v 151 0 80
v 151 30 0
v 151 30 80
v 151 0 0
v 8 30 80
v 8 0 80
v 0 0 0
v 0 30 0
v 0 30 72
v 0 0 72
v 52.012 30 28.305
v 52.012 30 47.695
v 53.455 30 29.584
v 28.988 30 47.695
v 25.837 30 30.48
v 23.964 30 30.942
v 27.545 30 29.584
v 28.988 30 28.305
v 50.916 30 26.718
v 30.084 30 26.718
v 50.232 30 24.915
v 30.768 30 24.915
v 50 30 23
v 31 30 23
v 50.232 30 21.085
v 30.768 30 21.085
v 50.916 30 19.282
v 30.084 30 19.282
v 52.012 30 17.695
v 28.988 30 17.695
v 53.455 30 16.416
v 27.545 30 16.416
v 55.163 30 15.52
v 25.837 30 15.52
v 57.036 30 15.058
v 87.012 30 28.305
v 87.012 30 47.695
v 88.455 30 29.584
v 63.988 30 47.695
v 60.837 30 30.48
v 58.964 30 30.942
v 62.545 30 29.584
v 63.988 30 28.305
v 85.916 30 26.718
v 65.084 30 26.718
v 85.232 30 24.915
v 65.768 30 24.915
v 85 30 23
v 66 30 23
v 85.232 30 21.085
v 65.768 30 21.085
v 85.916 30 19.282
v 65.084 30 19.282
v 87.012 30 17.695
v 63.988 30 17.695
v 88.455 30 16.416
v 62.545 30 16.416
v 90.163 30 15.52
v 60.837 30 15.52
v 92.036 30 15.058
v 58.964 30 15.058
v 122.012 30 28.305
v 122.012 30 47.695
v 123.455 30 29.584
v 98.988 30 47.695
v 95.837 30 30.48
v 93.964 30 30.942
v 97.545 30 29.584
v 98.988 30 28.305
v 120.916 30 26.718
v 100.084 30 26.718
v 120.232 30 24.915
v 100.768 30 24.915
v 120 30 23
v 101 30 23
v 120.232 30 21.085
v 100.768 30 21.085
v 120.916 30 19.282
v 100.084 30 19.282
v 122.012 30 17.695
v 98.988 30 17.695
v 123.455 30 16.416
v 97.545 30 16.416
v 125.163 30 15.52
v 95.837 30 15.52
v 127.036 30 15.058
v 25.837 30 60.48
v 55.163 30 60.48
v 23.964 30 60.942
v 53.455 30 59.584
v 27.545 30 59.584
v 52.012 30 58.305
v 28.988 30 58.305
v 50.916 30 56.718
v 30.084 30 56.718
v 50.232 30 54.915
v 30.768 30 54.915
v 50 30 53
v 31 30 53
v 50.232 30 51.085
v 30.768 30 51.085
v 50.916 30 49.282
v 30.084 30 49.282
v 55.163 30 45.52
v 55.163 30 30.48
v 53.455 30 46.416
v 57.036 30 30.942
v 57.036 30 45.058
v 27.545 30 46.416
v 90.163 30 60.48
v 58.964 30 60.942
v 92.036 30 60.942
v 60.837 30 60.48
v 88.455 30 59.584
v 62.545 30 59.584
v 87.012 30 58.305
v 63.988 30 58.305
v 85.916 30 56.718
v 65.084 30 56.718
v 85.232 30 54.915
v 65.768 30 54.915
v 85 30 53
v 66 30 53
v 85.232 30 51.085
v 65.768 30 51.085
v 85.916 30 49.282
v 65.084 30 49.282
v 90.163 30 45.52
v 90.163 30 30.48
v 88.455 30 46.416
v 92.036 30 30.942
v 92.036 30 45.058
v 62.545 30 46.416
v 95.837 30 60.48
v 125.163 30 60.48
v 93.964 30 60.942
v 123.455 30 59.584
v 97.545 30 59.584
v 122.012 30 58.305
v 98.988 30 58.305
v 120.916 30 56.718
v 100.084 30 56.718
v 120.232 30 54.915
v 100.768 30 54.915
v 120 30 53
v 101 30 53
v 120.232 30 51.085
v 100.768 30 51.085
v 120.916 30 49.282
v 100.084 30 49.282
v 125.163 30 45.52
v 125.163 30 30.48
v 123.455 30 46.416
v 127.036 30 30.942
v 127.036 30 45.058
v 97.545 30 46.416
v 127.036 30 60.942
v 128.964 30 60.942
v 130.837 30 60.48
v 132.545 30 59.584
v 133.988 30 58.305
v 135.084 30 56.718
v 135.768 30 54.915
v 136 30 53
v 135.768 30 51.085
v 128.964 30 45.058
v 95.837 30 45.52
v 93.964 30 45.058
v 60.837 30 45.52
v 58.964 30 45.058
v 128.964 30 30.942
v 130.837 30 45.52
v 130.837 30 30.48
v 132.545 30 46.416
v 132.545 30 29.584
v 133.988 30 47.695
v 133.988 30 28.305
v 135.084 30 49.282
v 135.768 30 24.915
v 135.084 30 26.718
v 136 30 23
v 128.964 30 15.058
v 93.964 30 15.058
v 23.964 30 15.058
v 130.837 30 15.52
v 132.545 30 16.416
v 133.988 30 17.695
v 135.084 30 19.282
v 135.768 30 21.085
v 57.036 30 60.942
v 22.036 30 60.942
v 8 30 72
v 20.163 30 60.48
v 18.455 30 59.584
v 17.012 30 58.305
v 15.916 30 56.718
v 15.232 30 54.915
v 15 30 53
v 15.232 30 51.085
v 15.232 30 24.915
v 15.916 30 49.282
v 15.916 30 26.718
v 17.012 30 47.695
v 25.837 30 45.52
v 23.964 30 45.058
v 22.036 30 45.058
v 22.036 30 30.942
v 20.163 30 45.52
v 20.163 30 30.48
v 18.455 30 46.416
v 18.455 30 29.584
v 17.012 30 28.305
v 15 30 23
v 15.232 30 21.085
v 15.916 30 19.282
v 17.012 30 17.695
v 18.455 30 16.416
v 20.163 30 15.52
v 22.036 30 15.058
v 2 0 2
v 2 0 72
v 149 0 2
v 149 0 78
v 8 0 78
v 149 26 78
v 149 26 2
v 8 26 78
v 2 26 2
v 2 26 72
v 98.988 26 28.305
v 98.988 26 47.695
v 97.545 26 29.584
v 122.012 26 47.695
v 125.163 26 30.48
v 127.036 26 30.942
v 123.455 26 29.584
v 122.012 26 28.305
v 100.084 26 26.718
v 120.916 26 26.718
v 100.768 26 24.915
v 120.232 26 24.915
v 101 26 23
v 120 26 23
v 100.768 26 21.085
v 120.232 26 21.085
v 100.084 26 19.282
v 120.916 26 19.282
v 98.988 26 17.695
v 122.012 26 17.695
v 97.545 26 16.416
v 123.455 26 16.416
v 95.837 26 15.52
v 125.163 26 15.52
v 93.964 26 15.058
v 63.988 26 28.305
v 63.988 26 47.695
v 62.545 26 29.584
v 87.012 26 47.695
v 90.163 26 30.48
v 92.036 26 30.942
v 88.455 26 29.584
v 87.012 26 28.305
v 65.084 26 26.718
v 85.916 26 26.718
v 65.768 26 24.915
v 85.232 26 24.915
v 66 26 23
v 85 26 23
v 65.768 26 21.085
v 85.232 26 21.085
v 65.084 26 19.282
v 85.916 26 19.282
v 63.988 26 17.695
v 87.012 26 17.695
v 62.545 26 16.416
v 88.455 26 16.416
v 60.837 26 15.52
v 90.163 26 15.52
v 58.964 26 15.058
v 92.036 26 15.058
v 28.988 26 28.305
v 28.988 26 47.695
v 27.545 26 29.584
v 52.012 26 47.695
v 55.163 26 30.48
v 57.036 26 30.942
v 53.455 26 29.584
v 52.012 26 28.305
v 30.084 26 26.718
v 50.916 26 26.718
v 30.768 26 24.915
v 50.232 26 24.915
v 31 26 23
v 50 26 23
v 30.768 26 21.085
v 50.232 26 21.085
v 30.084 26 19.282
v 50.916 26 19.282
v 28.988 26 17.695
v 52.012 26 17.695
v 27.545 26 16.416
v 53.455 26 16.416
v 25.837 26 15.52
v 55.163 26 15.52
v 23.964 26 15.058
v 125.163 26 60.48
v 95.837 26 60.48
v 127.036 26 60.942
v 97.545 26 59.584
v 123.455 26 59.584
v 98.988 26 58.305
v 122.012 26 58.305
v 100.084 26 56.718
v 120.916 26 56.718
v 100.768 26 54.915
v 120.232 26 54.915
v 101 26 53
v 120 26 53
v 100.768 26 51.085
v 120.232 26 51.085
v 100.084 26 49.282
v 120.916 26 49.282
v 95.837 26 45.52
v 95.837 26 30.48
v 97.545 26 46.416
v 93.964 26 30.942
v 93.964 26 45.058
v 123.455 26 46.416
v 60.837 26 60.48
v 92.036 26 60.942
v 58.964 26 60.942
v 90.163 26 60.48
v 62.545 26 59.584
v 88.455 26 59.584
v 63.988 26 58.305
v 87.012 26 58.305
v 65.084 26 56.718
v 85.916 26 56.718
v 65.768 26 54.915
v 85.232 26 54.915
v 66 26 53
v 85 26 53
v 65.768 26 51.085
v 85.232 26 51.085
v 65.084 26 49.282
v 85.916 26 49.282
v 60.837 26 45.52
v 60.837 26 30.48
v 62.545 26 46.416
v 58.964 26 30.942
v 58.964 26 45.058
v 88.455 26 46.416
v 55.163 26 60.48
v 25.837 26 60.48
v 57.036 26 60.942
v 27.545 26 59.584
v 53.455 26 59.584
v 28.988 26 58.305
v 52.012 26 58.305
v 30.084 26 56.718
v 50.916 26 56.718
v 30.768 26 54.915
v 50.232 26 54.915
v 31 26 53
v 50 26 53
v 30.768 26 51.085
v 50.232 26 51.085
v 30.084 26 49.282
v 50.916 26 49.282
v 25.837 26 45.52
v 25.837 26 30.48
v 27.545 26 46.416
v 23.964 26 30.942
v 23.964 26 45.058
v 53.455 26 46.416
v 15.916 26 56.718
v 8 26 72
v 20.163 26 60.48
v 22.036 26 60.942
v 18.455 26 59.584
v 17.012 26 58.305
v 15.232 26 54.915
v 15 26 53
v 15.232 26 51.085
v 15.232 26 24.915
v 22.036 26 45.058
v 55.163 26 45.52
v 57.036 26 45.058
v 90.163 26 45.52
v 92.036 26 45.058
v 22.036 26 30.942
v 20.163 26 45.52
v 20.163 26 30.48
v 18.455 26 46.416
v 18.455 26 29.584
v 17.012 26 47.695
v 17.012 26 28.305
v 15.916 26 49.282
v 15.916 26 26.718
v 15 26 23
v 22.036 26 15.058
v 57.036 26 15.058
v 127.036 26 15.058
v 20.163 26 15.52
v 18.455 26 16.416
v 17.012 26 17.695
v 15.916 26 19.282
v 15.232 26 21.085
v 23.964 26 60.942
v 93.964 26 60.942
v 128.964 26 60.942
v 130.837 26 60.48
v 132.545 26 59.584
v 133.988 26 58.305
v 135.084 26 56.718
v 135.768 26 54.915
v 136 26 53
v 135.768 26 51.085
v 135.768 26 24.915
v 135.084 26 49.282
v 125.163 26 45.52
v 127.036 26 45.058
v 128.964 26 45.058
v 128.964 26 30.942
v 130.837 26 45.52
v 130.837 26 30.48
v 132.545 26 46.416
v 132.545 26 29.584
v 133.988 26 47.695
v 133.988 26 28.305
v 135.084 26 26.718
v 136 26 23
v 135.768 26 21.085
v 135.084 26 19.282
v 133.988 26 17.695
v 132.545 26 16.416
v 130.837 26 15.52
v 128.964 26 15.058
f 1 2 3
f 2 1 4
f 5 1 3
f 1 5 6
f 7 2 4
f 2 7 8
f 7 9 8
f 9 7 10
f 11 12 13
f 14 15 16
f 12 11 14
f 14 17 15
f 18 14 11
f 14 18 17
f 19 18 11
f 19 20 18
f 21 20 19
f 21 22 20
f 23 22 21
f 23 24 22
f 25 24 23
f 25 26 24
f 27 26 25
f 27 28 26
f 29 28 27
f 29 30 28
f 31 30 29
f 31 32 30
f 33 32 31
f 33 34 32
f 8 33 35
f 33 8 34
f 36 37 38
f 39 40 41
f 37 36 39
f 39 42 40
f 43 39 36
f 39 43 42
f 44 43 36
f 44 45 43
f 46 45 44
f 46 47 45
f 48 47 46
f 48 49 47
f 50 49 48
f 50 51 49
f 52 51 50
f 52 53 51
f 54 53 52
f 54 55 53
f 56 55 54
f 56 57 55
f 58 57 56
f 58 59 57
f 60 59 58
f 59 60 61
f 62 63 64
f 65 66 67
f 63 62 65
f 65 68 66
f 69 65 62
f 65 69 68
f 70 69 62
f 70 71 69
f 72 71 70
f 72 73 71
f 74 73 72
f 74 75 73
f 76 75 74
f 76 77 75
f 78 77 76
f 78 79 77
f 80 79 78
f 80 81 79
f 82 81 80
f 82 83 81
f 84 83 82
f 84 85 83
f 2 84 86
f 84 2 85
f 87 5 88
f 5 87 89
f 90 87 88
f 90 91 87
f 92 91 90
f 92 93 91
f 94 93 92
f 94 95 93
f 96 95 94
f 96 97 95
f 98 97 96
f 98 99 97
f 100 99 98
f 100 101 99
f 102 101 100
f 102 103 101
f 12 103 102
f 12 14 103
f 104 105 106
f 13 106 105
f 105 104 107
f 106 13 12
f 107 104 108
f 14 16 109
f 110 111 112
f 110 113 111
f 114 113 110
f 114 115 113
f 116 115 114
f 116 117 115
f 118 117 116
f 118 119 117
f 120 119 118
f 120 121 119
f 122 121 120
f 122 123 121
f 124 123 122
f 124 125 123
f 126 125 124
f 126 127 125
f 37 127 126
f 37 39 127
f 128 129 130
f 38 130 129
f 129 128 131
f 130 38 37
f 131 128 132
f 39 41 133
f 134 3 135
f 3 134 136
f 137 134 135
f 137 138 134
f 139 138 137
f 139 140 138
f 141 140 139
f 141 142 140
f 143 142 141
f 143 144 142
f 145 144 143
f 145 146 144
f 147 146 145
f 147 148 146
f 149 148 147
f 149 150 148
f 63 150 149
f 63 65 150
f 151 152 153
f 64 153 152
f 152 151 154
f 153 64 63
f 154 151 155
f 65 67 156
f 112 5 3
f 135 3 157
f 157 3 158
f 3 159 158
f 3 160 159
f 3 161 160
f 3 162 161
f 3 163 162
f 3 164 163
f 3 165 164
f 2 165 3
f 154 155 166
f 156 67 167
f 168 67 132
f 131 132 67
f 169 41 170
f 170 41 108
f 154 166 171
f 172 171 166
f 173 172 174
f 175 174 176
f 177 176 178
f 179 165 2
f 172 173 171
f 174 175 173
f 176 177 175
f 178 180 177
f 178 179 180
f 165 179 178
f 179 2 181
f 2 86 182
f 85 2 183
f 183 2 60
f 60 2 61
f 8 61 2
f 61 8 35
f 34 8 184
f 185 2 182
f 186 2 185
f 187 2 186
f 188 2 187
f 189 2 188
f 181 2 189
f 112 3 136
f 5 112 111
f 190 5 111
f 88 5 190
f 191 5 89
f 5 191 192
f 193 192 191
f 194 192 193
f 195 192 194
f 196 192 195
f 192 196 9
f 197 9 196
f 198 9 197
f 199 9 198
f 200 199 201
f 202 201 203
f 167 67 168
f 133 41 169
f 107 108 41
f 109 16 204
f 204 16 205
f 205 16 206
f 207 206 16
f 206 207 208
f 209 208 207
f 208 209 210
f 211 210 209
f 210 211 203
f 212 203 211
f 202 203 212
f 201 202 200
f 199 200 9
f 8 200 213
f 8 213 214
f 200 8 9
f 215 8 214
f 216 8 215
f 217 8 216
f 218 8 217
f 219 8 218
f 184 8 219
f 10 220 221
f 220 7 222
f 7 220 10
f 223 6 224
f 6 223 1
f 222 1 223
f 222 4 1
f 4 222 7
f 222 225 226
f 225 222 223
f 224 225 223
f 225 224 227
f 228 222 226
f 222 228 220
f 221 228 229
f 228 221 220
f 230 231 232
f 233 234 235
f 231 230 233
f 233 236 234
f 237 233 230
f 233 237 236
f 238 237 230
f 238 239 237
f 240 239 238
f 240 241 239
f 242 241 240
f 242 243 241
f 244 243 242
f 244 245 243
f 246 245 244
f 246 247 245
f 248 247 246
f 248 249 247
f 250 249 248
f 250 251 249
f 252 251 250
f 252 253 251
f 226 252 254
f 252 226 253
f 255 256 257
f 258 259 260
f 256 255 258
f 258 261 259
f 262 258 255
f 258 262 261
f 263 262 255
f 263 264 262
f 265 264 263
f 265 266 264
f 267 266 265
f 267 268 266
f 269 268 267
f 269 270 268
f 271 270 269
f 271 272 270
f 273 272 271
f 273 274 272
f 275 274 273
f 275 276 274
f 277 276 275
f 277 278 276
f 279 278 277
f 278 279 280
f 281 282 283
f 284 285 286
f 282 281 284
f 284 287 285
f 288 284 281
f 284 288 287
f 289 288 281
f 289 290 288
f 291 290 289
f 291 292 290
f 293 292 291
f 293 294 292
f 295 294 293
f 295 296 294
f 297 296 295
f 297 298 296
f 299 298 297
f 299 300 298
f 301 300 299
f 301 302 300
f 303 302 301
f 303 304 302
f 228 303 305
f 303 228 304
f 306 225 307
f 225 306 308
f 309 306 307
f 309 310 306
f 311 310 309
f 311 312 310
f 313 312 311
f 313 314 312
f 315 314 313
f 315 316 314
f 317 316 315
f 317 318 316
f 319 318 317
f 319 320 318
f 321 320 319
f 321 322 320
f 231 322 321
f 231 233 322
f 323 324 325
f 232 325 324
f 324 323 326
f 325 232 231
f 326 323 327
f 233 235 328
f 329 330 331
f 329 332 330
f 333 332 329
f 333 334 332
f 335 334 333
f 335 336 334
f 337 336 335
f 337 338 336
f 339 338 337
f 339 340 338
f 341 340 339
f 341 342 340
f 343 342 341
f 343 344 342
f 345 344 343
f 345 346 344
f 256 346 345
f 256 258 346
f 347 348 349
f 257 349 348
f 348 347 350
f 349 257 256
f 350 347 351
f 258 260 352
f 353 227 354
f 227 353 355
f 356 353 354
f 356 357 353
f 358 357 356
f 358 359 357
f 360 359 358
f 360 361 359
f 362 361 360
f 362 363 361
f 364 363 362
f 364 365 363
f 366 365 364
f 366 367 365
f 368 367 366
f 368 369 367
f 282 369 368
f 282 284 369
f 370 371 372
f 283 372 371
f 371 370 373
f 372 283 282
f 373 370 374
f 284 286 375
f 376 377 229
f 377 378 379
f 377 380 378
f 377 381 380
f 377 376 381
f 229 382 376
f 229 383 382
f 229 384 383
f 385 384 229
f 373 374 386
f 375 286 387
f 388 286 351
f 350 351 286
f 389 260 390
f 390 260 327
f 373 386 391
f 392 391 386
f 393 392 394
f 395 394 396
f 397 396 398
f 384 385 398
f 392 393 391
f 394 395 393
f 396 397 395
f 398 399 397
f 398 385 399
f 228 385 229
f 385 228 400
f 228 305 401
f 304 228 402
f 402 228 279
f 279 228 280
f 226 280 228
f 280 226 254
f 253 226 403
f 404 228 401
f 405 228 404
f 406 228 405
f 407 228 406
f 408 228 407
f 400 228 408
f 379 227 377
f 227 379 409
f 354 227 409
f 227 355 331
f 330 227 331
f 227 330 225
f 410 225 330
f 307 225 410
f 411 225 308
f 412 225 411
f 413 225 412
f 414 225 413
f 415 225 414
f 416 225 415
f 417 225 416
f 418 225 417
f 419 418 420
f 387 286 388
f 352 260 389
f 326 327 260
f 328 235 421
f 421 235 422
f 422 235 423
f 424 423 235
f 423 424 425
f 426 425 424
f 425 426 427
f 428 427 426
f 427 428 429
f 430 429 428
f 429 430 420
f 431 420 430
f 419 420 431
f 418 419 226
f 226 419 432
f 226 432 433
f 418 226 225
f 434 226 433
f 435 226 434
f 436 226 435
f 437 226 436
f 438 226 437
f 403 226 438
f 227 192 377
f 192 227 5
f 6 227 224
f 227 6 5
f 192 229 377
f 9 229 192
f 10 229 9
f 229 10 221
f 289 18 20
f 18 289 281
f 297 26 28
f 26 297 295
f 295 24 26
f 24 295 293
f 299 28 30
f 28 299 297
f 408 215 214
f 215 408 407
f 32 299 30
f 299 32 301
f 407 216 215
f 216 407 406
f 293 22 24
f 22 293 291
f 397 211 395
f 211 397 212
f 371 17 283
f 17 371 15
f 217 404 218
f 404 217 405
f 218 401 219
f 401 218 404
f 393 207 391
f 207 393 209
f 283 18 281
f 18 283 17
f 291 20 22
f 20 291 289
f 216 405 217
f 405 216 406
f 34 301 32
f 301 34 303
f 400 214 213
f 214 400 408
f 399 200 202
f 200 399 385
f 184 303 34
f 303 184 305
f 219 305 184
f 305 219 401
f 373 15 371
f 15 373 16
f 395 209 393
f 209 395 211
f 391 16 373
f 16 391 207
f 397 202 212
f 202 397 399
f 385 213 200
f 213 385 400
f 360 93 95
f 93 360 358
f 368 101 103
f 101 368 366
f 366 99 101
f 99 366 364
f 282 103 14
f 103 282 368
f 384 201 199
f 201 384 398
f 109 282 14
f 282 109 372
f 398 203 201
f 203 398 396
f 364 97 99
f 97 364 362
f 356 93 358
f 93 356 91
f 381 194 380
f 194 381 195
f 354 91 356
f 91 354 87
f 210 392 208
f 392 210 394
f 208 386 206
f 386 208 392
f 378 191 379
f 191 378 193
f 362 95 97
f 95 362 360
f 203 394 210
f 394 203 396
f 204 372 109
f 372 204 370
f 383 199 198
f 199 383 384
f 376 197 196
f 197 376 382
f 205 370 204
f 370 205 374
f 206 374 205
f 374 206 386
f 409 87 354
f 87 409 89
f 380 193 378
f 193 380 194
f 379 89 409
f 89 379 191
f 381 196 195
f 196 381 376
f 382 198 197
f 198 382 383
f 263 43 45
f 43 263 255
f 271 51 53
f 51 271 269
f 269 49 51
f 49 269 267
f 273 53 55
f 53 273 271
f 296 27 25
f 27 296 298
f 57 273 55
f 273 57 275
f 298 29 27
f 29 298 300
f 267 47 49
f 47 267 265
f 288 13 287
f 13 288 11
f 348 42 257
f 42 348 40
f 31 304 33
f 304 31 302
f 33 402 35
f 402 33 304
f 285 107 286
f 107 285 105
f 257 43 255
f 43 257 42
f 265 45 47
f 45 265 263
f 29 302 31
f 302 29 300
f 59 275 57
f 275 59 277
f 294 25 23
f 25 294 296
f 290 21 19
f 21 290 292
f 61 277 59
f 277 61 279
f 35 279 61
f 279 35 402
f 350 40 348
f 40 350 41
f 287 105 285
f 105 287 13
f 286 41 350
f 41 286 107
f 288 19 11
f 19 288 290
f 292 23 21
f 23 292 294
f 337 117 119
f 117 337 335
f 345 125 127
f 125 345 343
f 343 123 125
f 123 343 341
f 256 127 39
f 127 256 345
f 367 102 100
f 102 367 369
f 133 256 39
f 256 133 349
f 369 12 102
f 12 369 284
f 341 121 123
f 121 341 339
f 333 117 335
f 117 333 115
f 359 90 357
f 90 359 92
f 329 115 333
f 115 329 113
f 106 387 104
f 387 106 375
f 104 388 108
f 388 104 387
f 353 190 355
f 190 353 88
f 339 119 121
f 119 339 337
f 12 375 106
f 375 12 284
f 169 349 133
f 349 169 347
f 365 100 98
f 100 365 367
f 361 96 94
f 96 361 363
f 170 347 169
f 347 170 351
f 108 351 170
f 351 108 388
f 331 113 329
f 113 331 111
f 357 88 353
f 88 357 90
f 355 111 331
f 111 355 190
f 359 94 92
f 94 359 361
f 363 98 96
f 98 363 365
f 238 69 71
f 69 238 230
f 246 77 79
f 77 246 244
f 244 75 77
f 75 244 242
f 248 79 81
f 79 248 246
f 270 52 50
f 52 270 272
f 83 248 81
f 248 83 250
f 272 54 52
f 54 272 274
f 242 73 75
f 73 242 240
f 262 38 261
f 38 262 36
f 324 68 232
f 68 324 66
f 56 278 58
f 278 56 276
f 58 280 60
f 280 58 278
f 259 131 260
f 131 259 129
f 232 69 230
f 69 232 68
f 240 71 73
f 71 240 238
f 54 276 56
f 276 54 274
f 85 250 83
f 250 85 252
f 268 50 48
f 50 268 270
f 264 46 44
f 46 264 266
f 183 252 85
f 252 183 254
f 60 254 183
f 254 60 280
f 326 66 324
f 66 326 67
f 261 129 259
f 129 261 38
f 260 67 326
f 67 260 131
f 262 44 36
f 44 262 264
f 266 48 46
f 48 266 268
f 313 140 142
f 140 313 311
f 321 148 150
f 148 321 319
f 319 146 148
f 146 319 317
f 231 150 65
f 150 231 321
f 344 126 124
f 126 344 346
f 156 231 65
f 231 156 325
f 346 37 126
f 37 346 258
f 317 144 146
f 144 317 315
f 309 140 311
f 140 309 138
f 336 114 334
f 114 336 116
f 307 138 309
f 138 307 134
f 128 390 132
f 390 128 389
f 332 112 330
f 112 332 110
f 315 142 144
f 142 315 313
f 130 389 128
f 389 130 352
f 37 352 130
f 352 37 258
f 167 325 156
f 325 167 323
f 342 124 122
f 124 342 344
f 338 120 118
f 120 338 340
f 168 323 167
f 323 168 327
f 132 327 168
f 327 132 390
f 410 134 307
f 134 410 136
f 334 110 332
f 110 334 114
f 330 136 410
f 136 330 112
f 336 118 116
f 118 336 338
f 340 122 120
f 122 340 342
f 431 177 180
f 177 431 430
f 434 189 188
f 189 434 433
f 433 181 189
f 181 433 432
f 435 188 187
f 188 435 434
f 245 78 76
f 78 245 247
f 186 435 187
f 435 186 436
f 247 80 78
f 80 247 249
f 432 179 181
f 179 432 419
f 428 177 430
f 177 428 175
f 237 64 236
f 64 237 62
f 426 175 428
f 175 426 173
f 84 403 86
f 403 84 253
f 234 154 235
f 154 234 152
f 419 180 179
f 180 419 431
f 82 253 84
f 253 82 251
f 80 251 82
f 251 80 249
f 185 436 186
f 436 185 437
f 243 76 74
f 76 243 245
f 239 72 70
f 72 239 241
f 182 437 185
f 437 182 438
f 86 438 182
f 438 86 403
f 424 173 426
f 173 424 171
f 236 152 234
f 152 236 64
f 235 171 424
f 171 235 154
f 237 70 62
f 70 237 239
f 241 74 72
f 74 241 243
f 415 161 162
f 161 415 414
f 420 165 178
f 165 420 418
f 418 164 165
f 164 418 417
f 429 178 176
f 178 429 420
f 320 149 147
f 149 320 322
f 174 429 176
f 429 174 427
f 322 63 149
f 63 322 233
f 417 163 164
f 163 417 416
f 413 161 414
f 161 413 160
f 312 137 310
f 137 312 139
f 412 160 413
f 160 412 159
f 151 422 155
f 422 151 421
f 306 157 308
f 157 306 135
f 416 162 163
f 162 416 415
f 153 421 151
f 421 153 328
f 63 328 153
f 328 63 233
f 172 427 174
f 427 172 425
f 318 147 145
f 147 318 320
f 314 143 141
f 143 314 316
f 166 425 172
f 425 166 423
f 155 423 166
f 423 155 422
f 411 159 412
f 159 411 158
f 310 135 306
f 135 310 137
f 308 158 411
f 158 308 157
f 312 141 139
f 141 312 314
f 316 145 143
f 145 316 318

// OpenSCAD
// file: button_cutout.scad
module button_cutout(){
    button_radius = 8;

    translate([button_radius,0,button_radius]) rotate([270,0,0])  cylinder(40,button_radius,    button_radius);
}
// main file
include <button_cutout.scad>;

display_housing_width = 151;
display_housing_depth = 30;
display_housing_height = 80;

shell_thickness = 2;


//translate up 60 the pcb height to normalize to 0

difference(){
    cube([display_housing_width,display_housing_depth,display_housing_height]);
    translate([shell_thickness, 0, shell_thickness]) #cube([display_housing_width - shell_thickness * 2,display_housing_depth - shell_thickness * 2,display_housing_height - shell_thickness * 2]);
    
    
    translate([0, 0 ,display_housing_height- 8]){
        #cube([8,display_housing_depth,8]);
    }
    
    translate([15,0,15]) #button_cutout();
    translate([15,0,45]) #button_cutout();
    translate([50,0,15]) #button_cutout();
    translate([50,0,45]) #button_cutout();
    translate([85,0,15]) #button_cutout();
    translate([85,0,45]) #button_cutout();
    translate([120,0,15]) #button_cutout();
    translate([120,0,45]) #button_cutout();
}
